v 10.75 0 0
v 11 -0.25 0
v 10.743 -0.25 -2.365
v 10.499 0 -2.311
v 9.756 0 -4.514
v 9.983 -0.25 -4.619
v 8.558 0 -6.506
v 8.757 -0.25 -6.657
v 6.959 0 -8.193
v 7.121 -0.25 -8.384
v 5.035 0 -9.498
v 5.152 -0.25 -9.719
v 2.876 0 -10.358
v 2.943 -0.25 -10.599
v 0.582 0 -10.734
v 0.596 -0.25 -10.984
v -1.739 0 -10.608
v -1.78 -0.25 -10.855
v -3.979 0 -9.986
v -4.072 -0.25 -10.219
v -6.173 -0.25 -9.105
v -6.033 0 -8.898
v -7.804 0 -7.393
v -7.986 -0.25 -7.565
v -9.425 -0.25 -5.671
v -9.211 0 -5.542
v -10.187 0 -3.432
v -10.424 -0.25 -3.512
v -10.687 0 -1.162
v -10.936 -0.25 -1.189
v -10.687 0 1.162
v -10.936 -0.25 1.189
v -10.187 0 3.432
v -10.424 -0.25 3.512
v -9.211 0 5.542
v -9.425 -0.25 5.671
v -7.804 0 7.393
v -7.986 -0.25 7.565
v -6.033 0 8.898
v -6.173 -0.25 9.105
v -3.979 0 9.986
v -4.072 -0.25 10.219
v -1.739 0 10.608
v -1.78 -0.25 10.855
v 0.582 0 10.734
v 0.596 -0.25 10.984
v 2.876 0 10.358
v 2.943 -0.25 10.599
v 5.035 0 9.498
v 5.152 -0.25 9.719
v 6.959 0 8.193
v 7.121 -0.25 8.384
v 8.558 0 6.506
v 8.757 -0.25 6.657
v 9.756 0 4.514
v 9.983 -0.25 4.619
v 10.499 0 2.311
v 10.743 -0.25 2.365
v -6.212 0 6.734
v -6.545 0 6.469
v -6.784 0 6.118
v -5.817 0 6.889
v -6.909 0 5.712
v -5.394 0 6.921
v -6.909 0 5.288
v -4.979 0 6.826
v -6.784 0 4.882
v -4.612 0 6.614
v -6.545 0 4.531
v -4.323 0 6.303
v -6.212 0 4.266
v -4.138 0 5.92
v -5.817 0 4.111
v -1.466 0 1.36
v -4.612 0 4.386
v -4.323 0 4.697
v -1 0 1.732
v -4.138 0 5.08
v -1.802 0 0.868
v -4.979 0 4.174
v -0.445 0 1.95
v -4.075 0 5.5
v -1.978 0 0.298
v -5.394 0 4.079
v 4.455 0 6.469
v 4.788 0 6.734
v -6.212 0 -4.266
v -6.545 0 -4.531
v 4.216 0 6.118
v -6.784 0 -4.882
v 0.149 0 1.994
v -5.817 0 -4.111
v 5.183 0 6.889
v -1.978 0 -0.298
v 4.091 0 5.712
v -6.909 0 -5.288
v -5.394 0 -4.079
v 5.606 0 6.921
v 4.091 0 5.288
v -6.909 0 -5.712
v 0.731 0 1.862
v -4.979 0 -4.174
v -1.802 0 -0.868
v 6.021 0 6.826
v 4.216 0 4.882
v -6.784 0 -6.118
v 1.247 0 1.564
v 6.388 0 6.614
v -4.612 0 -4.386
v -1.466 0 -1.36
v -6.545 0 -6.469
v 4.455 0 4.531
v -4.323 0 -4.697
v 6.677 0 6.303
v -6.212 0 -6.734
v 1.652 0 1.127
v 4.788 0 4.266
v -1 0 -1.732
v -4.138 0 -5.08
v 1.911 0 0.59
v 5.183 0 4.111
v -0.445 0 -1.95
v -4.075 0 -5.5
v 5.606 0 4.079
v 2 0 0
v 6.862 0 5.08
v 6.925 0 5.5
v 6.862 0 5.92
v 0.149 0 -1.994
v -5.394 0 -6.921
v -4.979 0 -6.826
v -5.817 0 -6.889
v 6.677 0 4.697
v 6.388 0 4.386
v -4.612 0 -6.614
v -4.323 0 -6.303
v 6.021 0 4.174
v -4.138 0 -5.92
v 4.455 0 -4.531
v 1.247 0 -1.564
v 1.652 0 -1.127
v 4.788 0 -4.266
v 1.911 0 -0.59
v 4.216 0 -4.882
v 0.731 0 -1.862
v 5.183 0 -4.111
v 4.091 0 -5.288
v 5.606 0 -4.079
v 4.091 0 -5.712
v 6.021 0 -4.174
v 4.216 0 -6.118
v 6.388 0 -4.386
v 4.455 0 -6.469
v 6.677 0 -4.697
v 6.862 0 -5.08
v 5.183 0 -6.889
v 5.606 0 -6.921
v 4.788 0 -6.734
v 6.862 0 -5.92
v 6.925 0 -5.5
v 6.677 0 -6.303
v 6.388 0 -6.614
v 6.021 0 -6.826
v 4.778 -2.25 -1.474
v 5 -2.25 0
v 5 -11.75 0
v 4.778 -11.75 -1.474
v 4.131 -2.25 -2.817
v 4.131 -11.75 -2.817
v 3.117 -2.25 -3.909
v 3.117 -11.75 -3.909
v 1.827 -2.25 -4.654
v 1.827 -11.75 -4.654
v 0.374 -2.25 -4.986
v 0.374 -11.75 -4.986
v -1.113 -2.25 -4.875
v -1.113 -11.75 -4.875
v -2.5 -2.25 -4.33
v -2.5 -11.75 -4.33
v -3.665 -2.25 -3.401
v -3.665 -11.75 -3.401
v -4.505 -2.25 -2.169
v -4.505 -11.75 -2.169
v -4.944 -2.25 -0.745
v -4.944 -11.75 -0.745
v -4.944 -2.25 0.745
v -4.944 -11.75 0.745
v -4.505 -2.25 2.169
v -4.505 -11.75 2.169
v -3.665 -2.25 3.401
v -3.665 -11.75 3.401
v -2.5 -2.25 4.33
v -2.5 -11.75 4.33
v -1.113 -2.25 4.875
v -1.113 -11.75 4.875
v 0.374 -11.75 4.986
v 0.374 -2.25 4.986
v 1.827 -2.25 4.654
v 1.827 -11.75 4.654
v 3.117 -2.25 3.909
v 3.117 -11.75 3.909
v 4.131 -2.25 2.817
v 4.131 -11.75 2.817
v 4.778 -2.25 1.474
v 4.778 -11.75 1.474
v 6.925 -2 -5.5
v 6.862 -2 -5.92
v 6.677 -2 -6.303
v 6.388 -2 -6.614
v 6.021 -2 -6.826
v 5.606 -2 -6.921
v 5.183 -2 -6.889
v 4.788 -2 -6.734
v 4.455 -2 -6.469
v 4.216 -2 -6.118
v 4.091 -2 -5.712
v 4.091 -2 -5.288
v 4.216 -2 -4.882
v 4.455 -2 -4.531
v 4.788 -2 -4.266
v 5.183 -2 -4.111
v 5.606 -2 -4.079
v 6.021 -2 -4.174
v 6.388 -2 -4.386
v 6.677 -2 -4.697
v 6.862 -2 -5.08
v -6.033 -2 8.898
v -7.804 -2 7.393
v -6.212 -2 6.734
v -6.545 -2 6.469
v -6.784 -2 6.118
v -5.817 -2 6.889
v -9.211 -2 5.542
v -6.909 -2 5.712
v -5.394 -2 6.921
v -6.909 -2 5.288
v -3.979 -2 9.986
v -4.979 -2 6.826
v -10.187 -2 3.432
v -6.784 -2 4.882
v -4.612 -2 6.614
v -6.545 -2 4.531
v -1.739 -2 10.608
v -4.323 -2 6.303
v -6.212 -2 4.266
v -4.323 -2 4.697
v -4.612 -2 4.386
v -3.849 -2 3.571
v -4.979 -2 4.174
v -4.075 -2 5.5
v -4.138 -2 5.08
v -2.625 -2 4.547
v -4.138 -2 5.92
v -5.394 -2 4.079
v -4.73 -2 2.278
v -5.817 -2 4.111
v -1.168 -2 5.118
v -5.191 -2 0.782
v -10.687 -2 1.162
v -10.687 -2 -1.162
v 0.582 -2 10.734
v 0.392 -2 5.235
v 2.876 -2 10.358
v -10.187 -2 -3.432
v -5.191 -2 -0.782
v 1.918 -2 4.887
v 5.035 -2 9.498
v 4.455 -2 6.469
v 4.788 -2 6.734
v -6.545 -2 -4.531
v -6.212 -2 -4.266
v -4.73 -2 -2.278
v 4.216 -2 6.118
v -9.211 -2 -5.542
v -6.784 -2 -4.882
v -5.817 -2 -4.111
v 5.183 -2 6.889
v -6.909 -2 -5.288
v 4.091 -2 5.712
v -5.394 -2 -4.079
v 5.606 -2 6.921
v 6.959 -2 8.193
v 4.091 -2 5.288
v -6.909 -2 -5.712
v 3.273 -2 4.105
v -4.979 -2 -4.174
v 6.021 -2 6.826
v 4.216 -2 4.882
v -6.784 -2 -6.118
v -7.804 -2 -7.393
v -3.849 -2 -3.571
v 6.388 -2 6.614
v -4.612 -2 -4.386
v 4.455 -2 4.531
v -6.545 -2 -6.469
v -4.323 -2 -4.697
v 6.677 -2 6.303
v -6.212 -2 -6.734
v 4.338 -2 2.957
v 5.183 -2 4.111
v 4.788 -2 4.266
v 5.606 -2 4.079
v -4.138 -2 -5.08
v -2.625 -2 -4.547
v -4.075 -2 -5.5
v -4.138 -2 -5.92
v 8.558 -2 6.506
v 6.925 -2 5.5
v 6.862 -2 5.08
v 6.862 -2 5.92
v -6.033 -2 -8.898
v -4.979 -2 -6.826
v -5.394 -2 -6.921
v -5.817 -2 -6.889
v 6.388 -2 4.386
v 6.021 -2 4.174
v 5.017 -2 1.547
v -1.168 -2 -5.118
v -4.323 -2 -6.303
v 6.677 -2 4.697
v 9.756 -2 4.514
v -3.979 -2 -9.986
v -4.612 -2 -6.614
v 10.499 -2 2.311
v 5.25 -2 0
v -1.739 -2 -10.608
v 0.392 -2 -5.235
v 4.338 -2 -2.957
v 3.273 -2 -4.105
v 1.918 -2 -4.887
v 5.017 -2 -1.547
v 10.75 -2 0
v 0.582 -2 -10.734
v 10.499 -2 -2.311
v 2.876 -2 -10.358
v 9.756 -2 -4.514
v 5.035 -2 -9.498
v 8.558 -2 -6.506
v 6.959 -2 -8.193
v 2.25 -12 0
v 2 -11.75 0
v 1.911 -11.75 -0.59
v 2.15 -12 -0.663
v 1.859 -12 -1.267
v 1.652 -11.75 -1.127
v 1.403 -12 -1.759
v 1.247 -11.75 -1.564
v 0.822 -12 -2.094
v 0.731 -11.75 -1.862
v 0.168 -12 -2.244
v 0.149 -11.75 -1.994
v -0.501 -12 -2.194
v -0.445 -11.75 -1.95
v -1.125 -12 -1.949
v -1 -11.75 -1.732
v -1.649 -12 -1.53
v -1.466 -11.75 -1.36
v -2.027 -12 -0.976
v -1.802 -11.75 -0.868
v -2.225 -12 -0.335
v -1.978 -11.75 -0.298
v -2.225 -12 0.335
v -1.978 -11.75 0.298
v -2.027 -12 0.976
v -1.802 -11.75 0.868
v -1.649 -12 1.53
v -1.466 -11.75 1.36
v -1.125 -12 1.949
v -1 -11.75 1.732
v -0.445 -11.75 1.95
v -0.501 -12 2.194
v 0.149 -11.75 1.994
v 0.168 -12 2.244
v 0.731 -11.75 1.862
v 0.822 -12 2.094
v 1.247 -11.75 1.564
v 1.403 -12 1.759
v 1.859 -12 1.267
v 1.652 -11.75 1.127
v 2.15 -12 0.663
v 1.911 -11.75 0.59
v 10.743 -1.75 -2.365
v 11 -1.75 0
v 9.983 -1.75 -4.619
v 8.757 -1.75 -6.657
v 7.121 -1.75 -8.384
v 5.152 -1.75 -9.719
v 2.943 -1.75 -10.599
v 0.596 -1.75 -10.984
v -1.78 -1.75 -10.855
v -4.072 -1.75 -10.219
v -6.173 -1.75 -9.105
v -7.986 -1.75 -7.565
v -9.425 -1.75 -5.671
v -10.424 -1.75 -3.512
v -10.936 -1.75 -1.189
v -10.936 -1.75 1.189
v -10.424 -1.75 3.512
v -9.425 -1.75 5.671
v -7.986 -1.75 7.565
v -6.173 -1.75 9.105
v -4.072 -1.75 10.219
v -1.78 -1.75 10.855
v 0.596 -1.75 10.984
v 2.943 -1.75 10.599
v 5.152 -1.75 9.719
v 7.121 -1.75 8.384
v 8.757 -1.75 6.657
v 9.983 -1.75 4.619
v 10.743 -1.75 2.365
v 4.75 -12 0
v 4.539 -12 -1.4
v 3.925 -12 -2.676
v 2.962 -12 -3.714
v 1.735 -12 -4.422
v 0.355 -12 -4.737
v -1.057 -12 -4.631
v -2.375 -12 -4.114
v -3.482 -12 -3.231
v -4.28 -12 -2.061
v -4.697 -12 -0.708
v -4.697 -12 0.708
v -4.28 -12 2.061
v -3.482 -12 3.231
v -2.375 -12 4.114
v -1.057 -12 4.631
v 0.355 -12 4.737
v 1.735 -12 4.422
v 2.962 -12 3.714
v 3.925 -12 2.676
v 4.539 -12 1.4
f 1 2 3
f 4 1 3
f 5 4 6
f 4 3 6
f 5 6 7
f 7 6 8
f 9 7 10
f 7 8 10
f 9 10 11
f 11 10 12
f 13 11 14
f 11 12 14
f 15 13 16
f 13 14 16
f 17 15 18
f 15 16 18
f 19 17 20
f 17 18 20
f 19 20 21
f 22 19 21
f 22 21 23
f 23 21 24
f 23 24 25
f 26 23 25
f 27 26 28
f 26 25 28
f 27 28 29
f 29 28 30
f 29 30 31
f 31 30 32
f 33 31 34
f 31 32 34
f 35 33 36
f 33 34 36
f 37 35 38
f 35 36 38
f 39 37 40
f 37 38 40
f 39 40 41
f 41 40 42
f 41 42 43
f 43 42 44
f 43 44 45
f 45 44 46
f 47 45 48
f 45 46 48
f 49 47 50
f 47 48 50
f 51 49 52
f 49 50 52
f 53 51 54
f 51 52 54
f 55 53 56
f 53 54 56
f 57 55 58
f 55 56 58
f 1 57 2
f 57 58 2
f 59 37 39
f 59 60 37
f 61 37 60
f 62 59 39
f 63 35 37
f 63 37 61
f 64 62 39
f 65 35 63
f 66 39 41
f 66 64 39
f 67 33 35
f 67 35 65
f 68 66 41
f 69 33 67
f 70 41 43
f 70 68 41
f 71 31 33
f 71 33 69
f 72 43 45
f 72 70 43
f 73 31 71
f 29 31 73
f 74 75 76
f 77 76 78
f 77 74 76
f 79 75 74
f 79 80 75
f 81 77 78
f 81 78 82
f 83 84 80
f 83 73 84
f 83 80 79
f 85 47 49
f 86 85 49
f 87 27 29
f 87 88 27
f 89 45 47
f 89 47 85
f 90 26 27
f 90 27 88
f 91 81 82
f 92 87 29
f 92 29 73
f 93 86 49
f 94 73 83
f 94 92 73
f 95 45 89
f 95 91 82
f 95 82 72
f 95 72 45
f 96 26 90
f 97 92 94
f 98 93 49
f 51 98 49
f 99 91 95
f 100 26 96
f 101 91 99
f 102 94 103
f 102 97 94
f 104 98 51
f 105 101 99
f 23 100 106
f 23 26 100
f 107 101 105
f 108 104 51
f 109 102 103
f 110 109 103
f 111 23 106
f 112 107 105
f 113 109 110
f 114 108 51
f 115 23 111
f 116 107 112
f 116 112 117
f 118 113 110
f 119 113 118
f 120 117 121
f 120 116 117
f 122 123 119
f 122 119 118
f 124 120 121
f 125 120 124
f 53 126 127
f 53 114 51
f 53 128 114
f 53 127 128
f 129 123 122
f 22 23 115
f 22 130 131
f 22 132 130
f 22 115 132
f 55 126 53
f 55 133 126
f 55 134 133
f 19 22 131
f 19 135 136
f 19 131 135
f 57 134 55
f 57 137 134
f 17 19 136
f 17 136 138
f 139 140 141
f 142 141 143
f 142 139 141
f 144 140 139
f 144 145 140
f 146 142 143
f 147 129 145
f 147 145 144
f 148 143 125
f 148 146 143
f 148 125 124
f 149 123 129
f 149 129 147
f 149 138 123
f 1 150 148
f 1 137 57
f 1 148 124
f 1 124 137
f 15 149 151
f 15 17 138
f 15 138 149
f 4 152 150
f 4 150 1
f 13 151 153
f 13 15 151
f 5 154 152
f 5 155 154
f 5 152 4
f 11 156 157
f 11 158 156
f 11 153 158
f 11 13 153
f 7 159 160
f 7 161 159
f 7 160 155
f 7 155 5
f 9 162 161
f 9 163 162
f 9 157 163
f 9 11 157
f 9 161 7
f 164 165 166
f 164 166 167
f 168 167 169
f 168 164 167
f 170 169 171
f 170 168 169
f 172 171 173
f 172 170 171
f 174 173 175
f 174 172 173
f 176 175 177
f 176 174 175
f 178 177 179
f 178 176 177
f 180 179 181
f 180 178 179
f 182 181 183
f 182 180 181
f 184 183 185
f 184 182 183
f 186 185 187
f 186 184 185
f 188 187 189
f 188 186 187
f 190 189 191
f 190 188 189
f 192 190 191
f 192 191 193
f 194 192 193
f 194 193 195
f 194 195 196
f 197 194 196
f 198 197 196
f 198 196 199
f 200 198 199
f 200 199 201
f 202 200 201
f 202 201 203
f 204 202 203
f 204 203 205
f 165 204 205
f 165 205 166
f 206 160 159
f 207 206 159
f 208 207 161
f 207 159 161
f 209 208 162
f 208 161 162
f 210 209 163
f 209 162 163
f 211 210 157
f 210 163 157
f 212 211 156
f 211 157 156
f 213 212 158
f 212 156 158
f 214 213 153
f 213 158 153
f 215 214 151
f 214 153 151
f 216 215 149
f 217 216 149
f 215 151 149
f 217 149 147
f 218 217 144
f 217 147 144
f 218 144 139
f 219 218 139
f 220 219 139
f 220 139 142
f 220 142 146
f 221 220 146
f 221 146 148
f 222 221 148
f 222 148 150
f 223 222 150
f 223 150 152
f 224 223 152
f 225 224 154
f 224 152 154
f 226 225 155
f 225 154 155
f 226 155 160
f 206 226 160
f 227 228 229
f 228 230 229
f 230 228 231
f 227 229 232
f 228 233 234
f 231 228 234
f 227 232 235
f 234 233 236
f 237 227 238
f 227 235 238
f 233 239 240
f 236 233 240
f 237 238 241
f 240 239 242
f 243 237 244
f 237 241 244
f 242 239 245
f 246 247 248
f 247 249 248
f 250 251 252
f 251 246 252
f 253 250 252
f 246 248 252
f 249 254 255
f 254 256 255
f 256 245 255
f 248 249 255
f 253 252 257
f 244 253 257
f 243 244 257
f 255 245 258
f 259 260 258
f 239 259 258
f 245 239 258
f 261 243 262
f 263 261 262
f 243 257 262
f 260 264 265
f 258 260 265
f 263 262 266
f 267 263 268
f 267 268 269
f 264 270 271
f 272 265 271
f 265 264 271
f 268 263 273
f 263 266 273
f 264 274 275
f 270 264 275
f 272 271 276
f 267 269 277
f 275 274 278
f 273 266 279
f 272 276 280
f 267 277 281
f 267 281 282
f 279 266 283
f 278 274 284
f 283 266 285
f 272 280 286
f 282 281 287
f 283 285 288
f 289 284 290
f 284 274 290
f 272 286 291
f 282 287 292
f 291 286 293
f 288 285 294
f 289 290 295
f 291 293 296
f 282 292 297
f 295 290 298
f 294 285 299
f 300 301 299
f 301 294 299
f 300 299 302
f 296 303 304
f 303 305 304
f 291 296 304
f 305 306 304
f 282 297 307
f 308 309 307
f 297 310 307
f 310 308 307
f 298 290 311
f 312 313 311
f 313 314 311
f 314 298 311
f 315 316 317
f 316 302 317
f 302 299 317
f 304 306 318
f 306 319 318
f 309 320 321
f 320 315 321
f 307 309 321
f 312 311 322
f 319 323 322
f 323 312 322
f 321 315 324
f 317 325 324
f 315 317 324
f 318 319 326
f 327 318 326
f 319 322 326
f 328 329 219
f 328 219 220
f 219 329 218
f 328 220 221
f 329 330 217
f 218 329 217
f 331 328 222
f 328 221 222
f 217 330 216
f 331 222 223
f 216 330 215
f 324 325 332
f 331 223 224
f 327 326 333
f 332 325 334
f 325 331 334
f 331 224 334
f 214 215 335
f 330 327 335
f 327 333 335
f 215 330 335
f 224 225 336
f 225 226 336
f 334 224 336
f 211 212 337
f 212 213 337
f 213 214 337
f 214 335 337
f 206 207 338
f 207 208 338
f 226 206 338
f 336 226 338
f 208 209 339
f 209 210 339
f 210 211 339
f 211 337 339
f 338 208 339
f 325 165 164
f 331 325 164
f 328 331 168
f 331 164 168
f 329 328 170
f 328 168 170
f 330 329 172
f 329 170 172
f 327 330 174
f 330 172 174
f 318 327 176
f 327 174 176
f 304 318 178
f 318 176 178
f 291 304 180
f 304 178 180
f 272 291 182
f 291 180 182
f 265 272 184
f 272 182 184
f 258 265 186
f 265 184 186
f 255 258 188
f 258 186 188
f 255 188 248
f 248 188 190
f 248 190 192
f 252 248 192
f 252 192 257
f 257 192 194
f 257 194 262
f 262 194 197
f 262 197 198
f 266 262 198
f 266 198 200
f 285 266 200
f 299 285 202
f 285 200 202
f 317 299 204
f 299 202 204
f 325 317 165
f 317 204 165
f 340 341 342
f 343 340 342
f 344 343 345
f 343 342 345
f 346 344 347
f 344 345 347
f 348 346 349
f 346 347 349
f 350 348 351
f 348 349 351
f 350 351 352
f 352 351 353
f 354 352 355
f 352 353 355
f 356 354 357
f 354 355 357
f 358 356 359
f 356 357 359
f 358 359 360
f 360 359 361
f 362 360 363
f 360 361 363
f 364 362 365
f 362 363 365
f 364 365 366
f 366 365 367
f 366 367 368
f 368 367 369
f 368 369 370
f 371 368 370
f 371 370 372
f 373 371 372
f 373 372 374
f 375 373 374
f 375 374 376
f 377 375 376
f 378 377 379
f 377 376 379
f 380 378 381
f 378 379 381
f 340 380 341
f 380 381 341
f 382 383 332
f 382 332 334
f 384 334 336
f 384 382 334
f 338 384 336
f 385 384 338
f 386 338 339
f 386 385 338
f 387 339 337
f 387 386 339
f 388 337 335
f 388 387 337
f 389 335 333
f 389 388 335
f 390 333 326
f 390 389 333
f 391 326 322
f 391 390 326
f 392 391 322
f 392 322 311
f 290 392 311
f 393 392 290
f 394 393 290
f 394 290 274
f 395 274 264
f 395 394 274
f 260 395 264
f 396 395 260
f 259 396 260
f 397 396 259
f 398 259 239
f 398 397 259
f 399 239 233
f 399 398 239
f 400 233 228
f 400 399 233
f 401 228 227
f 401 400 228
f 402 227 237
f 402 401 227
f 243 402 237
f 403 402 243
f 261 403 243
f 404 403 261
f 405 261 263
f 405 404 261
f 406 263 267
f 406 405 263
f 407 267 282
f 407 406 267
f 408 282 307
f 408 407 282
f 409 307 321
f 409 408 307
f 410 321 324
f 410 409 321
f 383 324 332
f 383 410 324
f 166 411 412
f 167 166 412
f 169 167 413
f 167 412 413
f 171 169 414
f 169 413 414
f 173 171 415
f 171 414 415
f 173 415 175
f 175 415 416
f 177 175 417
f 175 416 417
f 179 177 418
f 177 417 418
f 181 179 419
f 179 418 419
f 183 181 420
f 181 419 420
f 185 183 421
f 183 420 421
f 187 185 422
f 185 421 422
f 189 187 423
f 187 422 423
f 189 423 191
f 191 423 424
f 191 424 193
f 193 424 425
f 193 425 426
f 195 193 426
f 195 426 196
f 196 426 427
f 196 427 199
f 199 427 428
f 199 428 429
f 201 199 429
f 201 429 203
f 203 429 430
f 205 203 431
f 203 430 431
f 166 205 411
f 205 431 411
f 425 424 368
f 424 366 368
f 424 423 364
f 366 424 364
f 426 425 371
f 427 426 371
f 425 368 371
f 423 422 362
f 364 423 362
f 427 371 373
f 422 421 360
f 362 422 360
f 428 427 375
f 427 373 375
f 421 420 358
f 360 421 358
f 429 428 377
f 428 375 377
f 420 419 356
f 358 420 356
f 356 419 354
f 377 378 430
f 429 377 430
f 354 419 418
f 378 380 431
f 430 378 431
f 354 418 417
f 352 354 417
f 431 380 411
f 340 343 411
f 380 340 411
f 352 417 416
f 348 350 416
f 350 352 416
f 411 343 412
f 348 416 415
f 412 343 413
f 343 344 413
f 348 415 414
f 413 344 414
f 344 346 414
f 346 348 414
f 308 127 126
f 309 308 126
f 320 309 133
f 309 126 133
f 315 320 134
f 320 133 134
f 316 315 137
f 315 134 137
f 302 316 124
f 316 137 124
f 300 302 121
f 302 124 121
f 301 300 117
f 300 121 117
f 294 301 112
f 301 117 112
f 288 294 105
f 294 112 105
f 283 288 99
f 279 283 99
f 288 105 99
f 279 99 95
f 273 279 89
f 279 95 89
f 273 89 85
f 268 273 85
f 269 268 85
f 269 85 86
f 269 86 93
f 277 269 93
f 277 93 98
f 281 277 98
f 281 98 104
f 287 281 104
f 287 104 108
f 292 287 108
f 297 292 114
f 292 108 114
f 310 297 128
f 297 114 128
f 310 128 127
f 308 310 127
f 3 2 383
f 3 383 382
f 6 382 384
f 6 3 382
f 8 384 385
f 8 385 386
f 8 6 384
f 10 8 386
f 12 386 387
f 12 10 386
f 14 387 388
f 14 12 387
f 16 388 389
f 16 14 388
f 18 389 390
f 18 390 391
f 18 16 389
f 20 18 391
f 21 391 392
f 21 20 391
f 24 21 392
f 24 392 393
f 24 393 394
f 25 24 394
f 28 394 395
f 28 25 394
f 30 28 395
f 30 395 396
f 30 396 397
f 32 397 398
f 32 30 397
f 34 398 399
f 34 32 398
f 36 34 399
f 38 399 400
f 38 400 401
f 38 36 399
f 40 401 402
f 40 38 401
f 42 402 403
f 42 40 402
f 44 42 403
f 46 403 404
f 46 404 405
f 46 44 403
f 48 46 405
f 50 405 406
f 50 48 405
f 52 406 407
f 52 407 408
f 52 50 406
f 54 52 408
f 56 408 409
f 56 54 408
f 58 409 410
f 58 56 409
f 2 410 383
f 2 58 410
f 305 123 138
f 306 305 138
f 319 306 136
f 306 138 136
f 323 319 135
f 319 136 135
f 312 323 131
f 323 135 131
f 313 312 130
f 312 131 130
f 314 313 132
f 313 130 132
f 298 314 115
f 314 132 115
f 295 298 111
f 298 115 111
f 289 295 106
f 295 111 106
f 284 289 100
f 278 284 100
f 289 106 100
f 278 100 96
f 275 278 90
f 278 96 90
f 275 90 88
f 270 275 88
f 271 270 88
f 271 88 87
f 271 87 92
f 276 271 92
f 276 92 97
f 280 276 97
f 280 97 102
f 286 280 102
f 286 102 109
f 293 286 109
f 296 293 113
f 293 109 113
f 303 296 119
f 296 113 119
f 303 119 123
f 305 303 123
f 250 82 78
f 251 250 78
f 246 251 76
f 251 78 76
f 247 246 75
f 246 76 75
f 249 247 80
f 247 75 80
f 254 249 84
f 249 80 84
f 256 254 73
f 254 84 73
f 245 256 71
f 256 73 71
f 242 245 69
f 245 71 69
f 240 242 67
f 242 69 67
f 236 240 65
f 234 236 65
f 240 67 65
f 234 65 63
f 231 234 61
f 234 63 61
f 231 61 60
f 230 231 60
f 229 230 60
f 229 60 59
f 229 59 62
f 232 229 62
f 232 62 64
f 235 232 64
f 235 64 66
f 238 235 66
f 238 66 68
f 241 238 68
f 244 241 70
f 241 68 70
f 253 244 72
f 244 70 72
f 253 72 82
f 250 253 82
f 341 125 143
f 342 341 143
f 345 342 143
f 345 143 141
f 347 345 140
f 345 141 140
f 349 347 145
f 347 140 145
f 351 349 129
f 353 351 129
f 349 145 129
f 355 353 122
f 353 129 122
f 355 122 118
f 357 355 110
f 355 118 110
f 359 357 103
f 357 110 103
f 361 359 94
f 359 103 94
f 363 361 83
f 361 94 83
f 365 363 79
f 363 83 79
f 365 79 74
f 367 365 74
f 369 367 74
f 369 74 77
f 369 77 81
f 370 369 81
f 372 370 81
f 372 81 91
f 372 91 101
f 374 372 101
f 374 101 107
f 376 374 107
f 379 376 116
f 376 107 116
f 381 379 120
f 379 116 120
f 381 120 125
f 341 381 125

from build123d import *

# Parameters (mm, degrees)
SKETCH1_R           = 11
SKETCH1_R_2         = 2
SKETCH1_R_3         = 1.425
BOSS_EXTRUDE1_DEPTH = 2
SKETCH1_3_R         = 5
SKETCH1_3_R_2       = 2
BOSS_EXTRUDE2_DEPTH = 12
CHAMFER1_SIZE       = 0.25


with BuildPart() as part:
    # Sketch1 → Boss-Extrude1 (new body)
    with BuildSketch(Plane(origin=(0, 0, 0), x_dir=(1, 0, 0), z_dir=(0, 1, 0))):
        Circle(SKETCH1_R)
        Circle(SKETCH1_R_2, mode=Mode.SUBTRACT)
        with Locations((-5.5, 5.5)):
            Circle(SKETCH1_R_3, mode=Mode.SUBTRACT)
        with Locations((5.5, 5.5)):
            Circle(SKETCH1_R_3, mode=Mode.SUBTRACT)
        with Locations((5.5, -5.5)):
            Circle(SKETCH1_R_3, mode=Mode.SUBTRACT)
        with Locations((-5.5, -5.5)):
            Circle(SKETCH1_R_3, mode=Mode.SUBTRACT)
    extrude(amount=-BOSS_EXTRUDE1_DEPTH)

    # Sketch1<3> → Boss-Extrude2 (add)
    with BuildSketch(Plane(origin=(0, 0, 0), x_dir=(1, 0, 0), z_dir=(0, 1, 0))):
        Circle(SKETCH1_3_R)
        Circle(SKETCH1_3_R_2, mode=Mode.SUBTRACT)
    extrude(amount=-BOSS_EXTRUDE2_DEPTH)

    # Chamfer1
    chamfer1_edges = [part.edges().sort_by_distance(p)[0] for p in [
        (-5, -12, 0),
        (-5, -2, 0),
        (-2, -12, 0),
        (-11, -2, 0),
        (-11, 0, 0),
    ]]
    chamfer(chamfer1_edges, length=CHAMFER1_SIZE)


solid = part.part
